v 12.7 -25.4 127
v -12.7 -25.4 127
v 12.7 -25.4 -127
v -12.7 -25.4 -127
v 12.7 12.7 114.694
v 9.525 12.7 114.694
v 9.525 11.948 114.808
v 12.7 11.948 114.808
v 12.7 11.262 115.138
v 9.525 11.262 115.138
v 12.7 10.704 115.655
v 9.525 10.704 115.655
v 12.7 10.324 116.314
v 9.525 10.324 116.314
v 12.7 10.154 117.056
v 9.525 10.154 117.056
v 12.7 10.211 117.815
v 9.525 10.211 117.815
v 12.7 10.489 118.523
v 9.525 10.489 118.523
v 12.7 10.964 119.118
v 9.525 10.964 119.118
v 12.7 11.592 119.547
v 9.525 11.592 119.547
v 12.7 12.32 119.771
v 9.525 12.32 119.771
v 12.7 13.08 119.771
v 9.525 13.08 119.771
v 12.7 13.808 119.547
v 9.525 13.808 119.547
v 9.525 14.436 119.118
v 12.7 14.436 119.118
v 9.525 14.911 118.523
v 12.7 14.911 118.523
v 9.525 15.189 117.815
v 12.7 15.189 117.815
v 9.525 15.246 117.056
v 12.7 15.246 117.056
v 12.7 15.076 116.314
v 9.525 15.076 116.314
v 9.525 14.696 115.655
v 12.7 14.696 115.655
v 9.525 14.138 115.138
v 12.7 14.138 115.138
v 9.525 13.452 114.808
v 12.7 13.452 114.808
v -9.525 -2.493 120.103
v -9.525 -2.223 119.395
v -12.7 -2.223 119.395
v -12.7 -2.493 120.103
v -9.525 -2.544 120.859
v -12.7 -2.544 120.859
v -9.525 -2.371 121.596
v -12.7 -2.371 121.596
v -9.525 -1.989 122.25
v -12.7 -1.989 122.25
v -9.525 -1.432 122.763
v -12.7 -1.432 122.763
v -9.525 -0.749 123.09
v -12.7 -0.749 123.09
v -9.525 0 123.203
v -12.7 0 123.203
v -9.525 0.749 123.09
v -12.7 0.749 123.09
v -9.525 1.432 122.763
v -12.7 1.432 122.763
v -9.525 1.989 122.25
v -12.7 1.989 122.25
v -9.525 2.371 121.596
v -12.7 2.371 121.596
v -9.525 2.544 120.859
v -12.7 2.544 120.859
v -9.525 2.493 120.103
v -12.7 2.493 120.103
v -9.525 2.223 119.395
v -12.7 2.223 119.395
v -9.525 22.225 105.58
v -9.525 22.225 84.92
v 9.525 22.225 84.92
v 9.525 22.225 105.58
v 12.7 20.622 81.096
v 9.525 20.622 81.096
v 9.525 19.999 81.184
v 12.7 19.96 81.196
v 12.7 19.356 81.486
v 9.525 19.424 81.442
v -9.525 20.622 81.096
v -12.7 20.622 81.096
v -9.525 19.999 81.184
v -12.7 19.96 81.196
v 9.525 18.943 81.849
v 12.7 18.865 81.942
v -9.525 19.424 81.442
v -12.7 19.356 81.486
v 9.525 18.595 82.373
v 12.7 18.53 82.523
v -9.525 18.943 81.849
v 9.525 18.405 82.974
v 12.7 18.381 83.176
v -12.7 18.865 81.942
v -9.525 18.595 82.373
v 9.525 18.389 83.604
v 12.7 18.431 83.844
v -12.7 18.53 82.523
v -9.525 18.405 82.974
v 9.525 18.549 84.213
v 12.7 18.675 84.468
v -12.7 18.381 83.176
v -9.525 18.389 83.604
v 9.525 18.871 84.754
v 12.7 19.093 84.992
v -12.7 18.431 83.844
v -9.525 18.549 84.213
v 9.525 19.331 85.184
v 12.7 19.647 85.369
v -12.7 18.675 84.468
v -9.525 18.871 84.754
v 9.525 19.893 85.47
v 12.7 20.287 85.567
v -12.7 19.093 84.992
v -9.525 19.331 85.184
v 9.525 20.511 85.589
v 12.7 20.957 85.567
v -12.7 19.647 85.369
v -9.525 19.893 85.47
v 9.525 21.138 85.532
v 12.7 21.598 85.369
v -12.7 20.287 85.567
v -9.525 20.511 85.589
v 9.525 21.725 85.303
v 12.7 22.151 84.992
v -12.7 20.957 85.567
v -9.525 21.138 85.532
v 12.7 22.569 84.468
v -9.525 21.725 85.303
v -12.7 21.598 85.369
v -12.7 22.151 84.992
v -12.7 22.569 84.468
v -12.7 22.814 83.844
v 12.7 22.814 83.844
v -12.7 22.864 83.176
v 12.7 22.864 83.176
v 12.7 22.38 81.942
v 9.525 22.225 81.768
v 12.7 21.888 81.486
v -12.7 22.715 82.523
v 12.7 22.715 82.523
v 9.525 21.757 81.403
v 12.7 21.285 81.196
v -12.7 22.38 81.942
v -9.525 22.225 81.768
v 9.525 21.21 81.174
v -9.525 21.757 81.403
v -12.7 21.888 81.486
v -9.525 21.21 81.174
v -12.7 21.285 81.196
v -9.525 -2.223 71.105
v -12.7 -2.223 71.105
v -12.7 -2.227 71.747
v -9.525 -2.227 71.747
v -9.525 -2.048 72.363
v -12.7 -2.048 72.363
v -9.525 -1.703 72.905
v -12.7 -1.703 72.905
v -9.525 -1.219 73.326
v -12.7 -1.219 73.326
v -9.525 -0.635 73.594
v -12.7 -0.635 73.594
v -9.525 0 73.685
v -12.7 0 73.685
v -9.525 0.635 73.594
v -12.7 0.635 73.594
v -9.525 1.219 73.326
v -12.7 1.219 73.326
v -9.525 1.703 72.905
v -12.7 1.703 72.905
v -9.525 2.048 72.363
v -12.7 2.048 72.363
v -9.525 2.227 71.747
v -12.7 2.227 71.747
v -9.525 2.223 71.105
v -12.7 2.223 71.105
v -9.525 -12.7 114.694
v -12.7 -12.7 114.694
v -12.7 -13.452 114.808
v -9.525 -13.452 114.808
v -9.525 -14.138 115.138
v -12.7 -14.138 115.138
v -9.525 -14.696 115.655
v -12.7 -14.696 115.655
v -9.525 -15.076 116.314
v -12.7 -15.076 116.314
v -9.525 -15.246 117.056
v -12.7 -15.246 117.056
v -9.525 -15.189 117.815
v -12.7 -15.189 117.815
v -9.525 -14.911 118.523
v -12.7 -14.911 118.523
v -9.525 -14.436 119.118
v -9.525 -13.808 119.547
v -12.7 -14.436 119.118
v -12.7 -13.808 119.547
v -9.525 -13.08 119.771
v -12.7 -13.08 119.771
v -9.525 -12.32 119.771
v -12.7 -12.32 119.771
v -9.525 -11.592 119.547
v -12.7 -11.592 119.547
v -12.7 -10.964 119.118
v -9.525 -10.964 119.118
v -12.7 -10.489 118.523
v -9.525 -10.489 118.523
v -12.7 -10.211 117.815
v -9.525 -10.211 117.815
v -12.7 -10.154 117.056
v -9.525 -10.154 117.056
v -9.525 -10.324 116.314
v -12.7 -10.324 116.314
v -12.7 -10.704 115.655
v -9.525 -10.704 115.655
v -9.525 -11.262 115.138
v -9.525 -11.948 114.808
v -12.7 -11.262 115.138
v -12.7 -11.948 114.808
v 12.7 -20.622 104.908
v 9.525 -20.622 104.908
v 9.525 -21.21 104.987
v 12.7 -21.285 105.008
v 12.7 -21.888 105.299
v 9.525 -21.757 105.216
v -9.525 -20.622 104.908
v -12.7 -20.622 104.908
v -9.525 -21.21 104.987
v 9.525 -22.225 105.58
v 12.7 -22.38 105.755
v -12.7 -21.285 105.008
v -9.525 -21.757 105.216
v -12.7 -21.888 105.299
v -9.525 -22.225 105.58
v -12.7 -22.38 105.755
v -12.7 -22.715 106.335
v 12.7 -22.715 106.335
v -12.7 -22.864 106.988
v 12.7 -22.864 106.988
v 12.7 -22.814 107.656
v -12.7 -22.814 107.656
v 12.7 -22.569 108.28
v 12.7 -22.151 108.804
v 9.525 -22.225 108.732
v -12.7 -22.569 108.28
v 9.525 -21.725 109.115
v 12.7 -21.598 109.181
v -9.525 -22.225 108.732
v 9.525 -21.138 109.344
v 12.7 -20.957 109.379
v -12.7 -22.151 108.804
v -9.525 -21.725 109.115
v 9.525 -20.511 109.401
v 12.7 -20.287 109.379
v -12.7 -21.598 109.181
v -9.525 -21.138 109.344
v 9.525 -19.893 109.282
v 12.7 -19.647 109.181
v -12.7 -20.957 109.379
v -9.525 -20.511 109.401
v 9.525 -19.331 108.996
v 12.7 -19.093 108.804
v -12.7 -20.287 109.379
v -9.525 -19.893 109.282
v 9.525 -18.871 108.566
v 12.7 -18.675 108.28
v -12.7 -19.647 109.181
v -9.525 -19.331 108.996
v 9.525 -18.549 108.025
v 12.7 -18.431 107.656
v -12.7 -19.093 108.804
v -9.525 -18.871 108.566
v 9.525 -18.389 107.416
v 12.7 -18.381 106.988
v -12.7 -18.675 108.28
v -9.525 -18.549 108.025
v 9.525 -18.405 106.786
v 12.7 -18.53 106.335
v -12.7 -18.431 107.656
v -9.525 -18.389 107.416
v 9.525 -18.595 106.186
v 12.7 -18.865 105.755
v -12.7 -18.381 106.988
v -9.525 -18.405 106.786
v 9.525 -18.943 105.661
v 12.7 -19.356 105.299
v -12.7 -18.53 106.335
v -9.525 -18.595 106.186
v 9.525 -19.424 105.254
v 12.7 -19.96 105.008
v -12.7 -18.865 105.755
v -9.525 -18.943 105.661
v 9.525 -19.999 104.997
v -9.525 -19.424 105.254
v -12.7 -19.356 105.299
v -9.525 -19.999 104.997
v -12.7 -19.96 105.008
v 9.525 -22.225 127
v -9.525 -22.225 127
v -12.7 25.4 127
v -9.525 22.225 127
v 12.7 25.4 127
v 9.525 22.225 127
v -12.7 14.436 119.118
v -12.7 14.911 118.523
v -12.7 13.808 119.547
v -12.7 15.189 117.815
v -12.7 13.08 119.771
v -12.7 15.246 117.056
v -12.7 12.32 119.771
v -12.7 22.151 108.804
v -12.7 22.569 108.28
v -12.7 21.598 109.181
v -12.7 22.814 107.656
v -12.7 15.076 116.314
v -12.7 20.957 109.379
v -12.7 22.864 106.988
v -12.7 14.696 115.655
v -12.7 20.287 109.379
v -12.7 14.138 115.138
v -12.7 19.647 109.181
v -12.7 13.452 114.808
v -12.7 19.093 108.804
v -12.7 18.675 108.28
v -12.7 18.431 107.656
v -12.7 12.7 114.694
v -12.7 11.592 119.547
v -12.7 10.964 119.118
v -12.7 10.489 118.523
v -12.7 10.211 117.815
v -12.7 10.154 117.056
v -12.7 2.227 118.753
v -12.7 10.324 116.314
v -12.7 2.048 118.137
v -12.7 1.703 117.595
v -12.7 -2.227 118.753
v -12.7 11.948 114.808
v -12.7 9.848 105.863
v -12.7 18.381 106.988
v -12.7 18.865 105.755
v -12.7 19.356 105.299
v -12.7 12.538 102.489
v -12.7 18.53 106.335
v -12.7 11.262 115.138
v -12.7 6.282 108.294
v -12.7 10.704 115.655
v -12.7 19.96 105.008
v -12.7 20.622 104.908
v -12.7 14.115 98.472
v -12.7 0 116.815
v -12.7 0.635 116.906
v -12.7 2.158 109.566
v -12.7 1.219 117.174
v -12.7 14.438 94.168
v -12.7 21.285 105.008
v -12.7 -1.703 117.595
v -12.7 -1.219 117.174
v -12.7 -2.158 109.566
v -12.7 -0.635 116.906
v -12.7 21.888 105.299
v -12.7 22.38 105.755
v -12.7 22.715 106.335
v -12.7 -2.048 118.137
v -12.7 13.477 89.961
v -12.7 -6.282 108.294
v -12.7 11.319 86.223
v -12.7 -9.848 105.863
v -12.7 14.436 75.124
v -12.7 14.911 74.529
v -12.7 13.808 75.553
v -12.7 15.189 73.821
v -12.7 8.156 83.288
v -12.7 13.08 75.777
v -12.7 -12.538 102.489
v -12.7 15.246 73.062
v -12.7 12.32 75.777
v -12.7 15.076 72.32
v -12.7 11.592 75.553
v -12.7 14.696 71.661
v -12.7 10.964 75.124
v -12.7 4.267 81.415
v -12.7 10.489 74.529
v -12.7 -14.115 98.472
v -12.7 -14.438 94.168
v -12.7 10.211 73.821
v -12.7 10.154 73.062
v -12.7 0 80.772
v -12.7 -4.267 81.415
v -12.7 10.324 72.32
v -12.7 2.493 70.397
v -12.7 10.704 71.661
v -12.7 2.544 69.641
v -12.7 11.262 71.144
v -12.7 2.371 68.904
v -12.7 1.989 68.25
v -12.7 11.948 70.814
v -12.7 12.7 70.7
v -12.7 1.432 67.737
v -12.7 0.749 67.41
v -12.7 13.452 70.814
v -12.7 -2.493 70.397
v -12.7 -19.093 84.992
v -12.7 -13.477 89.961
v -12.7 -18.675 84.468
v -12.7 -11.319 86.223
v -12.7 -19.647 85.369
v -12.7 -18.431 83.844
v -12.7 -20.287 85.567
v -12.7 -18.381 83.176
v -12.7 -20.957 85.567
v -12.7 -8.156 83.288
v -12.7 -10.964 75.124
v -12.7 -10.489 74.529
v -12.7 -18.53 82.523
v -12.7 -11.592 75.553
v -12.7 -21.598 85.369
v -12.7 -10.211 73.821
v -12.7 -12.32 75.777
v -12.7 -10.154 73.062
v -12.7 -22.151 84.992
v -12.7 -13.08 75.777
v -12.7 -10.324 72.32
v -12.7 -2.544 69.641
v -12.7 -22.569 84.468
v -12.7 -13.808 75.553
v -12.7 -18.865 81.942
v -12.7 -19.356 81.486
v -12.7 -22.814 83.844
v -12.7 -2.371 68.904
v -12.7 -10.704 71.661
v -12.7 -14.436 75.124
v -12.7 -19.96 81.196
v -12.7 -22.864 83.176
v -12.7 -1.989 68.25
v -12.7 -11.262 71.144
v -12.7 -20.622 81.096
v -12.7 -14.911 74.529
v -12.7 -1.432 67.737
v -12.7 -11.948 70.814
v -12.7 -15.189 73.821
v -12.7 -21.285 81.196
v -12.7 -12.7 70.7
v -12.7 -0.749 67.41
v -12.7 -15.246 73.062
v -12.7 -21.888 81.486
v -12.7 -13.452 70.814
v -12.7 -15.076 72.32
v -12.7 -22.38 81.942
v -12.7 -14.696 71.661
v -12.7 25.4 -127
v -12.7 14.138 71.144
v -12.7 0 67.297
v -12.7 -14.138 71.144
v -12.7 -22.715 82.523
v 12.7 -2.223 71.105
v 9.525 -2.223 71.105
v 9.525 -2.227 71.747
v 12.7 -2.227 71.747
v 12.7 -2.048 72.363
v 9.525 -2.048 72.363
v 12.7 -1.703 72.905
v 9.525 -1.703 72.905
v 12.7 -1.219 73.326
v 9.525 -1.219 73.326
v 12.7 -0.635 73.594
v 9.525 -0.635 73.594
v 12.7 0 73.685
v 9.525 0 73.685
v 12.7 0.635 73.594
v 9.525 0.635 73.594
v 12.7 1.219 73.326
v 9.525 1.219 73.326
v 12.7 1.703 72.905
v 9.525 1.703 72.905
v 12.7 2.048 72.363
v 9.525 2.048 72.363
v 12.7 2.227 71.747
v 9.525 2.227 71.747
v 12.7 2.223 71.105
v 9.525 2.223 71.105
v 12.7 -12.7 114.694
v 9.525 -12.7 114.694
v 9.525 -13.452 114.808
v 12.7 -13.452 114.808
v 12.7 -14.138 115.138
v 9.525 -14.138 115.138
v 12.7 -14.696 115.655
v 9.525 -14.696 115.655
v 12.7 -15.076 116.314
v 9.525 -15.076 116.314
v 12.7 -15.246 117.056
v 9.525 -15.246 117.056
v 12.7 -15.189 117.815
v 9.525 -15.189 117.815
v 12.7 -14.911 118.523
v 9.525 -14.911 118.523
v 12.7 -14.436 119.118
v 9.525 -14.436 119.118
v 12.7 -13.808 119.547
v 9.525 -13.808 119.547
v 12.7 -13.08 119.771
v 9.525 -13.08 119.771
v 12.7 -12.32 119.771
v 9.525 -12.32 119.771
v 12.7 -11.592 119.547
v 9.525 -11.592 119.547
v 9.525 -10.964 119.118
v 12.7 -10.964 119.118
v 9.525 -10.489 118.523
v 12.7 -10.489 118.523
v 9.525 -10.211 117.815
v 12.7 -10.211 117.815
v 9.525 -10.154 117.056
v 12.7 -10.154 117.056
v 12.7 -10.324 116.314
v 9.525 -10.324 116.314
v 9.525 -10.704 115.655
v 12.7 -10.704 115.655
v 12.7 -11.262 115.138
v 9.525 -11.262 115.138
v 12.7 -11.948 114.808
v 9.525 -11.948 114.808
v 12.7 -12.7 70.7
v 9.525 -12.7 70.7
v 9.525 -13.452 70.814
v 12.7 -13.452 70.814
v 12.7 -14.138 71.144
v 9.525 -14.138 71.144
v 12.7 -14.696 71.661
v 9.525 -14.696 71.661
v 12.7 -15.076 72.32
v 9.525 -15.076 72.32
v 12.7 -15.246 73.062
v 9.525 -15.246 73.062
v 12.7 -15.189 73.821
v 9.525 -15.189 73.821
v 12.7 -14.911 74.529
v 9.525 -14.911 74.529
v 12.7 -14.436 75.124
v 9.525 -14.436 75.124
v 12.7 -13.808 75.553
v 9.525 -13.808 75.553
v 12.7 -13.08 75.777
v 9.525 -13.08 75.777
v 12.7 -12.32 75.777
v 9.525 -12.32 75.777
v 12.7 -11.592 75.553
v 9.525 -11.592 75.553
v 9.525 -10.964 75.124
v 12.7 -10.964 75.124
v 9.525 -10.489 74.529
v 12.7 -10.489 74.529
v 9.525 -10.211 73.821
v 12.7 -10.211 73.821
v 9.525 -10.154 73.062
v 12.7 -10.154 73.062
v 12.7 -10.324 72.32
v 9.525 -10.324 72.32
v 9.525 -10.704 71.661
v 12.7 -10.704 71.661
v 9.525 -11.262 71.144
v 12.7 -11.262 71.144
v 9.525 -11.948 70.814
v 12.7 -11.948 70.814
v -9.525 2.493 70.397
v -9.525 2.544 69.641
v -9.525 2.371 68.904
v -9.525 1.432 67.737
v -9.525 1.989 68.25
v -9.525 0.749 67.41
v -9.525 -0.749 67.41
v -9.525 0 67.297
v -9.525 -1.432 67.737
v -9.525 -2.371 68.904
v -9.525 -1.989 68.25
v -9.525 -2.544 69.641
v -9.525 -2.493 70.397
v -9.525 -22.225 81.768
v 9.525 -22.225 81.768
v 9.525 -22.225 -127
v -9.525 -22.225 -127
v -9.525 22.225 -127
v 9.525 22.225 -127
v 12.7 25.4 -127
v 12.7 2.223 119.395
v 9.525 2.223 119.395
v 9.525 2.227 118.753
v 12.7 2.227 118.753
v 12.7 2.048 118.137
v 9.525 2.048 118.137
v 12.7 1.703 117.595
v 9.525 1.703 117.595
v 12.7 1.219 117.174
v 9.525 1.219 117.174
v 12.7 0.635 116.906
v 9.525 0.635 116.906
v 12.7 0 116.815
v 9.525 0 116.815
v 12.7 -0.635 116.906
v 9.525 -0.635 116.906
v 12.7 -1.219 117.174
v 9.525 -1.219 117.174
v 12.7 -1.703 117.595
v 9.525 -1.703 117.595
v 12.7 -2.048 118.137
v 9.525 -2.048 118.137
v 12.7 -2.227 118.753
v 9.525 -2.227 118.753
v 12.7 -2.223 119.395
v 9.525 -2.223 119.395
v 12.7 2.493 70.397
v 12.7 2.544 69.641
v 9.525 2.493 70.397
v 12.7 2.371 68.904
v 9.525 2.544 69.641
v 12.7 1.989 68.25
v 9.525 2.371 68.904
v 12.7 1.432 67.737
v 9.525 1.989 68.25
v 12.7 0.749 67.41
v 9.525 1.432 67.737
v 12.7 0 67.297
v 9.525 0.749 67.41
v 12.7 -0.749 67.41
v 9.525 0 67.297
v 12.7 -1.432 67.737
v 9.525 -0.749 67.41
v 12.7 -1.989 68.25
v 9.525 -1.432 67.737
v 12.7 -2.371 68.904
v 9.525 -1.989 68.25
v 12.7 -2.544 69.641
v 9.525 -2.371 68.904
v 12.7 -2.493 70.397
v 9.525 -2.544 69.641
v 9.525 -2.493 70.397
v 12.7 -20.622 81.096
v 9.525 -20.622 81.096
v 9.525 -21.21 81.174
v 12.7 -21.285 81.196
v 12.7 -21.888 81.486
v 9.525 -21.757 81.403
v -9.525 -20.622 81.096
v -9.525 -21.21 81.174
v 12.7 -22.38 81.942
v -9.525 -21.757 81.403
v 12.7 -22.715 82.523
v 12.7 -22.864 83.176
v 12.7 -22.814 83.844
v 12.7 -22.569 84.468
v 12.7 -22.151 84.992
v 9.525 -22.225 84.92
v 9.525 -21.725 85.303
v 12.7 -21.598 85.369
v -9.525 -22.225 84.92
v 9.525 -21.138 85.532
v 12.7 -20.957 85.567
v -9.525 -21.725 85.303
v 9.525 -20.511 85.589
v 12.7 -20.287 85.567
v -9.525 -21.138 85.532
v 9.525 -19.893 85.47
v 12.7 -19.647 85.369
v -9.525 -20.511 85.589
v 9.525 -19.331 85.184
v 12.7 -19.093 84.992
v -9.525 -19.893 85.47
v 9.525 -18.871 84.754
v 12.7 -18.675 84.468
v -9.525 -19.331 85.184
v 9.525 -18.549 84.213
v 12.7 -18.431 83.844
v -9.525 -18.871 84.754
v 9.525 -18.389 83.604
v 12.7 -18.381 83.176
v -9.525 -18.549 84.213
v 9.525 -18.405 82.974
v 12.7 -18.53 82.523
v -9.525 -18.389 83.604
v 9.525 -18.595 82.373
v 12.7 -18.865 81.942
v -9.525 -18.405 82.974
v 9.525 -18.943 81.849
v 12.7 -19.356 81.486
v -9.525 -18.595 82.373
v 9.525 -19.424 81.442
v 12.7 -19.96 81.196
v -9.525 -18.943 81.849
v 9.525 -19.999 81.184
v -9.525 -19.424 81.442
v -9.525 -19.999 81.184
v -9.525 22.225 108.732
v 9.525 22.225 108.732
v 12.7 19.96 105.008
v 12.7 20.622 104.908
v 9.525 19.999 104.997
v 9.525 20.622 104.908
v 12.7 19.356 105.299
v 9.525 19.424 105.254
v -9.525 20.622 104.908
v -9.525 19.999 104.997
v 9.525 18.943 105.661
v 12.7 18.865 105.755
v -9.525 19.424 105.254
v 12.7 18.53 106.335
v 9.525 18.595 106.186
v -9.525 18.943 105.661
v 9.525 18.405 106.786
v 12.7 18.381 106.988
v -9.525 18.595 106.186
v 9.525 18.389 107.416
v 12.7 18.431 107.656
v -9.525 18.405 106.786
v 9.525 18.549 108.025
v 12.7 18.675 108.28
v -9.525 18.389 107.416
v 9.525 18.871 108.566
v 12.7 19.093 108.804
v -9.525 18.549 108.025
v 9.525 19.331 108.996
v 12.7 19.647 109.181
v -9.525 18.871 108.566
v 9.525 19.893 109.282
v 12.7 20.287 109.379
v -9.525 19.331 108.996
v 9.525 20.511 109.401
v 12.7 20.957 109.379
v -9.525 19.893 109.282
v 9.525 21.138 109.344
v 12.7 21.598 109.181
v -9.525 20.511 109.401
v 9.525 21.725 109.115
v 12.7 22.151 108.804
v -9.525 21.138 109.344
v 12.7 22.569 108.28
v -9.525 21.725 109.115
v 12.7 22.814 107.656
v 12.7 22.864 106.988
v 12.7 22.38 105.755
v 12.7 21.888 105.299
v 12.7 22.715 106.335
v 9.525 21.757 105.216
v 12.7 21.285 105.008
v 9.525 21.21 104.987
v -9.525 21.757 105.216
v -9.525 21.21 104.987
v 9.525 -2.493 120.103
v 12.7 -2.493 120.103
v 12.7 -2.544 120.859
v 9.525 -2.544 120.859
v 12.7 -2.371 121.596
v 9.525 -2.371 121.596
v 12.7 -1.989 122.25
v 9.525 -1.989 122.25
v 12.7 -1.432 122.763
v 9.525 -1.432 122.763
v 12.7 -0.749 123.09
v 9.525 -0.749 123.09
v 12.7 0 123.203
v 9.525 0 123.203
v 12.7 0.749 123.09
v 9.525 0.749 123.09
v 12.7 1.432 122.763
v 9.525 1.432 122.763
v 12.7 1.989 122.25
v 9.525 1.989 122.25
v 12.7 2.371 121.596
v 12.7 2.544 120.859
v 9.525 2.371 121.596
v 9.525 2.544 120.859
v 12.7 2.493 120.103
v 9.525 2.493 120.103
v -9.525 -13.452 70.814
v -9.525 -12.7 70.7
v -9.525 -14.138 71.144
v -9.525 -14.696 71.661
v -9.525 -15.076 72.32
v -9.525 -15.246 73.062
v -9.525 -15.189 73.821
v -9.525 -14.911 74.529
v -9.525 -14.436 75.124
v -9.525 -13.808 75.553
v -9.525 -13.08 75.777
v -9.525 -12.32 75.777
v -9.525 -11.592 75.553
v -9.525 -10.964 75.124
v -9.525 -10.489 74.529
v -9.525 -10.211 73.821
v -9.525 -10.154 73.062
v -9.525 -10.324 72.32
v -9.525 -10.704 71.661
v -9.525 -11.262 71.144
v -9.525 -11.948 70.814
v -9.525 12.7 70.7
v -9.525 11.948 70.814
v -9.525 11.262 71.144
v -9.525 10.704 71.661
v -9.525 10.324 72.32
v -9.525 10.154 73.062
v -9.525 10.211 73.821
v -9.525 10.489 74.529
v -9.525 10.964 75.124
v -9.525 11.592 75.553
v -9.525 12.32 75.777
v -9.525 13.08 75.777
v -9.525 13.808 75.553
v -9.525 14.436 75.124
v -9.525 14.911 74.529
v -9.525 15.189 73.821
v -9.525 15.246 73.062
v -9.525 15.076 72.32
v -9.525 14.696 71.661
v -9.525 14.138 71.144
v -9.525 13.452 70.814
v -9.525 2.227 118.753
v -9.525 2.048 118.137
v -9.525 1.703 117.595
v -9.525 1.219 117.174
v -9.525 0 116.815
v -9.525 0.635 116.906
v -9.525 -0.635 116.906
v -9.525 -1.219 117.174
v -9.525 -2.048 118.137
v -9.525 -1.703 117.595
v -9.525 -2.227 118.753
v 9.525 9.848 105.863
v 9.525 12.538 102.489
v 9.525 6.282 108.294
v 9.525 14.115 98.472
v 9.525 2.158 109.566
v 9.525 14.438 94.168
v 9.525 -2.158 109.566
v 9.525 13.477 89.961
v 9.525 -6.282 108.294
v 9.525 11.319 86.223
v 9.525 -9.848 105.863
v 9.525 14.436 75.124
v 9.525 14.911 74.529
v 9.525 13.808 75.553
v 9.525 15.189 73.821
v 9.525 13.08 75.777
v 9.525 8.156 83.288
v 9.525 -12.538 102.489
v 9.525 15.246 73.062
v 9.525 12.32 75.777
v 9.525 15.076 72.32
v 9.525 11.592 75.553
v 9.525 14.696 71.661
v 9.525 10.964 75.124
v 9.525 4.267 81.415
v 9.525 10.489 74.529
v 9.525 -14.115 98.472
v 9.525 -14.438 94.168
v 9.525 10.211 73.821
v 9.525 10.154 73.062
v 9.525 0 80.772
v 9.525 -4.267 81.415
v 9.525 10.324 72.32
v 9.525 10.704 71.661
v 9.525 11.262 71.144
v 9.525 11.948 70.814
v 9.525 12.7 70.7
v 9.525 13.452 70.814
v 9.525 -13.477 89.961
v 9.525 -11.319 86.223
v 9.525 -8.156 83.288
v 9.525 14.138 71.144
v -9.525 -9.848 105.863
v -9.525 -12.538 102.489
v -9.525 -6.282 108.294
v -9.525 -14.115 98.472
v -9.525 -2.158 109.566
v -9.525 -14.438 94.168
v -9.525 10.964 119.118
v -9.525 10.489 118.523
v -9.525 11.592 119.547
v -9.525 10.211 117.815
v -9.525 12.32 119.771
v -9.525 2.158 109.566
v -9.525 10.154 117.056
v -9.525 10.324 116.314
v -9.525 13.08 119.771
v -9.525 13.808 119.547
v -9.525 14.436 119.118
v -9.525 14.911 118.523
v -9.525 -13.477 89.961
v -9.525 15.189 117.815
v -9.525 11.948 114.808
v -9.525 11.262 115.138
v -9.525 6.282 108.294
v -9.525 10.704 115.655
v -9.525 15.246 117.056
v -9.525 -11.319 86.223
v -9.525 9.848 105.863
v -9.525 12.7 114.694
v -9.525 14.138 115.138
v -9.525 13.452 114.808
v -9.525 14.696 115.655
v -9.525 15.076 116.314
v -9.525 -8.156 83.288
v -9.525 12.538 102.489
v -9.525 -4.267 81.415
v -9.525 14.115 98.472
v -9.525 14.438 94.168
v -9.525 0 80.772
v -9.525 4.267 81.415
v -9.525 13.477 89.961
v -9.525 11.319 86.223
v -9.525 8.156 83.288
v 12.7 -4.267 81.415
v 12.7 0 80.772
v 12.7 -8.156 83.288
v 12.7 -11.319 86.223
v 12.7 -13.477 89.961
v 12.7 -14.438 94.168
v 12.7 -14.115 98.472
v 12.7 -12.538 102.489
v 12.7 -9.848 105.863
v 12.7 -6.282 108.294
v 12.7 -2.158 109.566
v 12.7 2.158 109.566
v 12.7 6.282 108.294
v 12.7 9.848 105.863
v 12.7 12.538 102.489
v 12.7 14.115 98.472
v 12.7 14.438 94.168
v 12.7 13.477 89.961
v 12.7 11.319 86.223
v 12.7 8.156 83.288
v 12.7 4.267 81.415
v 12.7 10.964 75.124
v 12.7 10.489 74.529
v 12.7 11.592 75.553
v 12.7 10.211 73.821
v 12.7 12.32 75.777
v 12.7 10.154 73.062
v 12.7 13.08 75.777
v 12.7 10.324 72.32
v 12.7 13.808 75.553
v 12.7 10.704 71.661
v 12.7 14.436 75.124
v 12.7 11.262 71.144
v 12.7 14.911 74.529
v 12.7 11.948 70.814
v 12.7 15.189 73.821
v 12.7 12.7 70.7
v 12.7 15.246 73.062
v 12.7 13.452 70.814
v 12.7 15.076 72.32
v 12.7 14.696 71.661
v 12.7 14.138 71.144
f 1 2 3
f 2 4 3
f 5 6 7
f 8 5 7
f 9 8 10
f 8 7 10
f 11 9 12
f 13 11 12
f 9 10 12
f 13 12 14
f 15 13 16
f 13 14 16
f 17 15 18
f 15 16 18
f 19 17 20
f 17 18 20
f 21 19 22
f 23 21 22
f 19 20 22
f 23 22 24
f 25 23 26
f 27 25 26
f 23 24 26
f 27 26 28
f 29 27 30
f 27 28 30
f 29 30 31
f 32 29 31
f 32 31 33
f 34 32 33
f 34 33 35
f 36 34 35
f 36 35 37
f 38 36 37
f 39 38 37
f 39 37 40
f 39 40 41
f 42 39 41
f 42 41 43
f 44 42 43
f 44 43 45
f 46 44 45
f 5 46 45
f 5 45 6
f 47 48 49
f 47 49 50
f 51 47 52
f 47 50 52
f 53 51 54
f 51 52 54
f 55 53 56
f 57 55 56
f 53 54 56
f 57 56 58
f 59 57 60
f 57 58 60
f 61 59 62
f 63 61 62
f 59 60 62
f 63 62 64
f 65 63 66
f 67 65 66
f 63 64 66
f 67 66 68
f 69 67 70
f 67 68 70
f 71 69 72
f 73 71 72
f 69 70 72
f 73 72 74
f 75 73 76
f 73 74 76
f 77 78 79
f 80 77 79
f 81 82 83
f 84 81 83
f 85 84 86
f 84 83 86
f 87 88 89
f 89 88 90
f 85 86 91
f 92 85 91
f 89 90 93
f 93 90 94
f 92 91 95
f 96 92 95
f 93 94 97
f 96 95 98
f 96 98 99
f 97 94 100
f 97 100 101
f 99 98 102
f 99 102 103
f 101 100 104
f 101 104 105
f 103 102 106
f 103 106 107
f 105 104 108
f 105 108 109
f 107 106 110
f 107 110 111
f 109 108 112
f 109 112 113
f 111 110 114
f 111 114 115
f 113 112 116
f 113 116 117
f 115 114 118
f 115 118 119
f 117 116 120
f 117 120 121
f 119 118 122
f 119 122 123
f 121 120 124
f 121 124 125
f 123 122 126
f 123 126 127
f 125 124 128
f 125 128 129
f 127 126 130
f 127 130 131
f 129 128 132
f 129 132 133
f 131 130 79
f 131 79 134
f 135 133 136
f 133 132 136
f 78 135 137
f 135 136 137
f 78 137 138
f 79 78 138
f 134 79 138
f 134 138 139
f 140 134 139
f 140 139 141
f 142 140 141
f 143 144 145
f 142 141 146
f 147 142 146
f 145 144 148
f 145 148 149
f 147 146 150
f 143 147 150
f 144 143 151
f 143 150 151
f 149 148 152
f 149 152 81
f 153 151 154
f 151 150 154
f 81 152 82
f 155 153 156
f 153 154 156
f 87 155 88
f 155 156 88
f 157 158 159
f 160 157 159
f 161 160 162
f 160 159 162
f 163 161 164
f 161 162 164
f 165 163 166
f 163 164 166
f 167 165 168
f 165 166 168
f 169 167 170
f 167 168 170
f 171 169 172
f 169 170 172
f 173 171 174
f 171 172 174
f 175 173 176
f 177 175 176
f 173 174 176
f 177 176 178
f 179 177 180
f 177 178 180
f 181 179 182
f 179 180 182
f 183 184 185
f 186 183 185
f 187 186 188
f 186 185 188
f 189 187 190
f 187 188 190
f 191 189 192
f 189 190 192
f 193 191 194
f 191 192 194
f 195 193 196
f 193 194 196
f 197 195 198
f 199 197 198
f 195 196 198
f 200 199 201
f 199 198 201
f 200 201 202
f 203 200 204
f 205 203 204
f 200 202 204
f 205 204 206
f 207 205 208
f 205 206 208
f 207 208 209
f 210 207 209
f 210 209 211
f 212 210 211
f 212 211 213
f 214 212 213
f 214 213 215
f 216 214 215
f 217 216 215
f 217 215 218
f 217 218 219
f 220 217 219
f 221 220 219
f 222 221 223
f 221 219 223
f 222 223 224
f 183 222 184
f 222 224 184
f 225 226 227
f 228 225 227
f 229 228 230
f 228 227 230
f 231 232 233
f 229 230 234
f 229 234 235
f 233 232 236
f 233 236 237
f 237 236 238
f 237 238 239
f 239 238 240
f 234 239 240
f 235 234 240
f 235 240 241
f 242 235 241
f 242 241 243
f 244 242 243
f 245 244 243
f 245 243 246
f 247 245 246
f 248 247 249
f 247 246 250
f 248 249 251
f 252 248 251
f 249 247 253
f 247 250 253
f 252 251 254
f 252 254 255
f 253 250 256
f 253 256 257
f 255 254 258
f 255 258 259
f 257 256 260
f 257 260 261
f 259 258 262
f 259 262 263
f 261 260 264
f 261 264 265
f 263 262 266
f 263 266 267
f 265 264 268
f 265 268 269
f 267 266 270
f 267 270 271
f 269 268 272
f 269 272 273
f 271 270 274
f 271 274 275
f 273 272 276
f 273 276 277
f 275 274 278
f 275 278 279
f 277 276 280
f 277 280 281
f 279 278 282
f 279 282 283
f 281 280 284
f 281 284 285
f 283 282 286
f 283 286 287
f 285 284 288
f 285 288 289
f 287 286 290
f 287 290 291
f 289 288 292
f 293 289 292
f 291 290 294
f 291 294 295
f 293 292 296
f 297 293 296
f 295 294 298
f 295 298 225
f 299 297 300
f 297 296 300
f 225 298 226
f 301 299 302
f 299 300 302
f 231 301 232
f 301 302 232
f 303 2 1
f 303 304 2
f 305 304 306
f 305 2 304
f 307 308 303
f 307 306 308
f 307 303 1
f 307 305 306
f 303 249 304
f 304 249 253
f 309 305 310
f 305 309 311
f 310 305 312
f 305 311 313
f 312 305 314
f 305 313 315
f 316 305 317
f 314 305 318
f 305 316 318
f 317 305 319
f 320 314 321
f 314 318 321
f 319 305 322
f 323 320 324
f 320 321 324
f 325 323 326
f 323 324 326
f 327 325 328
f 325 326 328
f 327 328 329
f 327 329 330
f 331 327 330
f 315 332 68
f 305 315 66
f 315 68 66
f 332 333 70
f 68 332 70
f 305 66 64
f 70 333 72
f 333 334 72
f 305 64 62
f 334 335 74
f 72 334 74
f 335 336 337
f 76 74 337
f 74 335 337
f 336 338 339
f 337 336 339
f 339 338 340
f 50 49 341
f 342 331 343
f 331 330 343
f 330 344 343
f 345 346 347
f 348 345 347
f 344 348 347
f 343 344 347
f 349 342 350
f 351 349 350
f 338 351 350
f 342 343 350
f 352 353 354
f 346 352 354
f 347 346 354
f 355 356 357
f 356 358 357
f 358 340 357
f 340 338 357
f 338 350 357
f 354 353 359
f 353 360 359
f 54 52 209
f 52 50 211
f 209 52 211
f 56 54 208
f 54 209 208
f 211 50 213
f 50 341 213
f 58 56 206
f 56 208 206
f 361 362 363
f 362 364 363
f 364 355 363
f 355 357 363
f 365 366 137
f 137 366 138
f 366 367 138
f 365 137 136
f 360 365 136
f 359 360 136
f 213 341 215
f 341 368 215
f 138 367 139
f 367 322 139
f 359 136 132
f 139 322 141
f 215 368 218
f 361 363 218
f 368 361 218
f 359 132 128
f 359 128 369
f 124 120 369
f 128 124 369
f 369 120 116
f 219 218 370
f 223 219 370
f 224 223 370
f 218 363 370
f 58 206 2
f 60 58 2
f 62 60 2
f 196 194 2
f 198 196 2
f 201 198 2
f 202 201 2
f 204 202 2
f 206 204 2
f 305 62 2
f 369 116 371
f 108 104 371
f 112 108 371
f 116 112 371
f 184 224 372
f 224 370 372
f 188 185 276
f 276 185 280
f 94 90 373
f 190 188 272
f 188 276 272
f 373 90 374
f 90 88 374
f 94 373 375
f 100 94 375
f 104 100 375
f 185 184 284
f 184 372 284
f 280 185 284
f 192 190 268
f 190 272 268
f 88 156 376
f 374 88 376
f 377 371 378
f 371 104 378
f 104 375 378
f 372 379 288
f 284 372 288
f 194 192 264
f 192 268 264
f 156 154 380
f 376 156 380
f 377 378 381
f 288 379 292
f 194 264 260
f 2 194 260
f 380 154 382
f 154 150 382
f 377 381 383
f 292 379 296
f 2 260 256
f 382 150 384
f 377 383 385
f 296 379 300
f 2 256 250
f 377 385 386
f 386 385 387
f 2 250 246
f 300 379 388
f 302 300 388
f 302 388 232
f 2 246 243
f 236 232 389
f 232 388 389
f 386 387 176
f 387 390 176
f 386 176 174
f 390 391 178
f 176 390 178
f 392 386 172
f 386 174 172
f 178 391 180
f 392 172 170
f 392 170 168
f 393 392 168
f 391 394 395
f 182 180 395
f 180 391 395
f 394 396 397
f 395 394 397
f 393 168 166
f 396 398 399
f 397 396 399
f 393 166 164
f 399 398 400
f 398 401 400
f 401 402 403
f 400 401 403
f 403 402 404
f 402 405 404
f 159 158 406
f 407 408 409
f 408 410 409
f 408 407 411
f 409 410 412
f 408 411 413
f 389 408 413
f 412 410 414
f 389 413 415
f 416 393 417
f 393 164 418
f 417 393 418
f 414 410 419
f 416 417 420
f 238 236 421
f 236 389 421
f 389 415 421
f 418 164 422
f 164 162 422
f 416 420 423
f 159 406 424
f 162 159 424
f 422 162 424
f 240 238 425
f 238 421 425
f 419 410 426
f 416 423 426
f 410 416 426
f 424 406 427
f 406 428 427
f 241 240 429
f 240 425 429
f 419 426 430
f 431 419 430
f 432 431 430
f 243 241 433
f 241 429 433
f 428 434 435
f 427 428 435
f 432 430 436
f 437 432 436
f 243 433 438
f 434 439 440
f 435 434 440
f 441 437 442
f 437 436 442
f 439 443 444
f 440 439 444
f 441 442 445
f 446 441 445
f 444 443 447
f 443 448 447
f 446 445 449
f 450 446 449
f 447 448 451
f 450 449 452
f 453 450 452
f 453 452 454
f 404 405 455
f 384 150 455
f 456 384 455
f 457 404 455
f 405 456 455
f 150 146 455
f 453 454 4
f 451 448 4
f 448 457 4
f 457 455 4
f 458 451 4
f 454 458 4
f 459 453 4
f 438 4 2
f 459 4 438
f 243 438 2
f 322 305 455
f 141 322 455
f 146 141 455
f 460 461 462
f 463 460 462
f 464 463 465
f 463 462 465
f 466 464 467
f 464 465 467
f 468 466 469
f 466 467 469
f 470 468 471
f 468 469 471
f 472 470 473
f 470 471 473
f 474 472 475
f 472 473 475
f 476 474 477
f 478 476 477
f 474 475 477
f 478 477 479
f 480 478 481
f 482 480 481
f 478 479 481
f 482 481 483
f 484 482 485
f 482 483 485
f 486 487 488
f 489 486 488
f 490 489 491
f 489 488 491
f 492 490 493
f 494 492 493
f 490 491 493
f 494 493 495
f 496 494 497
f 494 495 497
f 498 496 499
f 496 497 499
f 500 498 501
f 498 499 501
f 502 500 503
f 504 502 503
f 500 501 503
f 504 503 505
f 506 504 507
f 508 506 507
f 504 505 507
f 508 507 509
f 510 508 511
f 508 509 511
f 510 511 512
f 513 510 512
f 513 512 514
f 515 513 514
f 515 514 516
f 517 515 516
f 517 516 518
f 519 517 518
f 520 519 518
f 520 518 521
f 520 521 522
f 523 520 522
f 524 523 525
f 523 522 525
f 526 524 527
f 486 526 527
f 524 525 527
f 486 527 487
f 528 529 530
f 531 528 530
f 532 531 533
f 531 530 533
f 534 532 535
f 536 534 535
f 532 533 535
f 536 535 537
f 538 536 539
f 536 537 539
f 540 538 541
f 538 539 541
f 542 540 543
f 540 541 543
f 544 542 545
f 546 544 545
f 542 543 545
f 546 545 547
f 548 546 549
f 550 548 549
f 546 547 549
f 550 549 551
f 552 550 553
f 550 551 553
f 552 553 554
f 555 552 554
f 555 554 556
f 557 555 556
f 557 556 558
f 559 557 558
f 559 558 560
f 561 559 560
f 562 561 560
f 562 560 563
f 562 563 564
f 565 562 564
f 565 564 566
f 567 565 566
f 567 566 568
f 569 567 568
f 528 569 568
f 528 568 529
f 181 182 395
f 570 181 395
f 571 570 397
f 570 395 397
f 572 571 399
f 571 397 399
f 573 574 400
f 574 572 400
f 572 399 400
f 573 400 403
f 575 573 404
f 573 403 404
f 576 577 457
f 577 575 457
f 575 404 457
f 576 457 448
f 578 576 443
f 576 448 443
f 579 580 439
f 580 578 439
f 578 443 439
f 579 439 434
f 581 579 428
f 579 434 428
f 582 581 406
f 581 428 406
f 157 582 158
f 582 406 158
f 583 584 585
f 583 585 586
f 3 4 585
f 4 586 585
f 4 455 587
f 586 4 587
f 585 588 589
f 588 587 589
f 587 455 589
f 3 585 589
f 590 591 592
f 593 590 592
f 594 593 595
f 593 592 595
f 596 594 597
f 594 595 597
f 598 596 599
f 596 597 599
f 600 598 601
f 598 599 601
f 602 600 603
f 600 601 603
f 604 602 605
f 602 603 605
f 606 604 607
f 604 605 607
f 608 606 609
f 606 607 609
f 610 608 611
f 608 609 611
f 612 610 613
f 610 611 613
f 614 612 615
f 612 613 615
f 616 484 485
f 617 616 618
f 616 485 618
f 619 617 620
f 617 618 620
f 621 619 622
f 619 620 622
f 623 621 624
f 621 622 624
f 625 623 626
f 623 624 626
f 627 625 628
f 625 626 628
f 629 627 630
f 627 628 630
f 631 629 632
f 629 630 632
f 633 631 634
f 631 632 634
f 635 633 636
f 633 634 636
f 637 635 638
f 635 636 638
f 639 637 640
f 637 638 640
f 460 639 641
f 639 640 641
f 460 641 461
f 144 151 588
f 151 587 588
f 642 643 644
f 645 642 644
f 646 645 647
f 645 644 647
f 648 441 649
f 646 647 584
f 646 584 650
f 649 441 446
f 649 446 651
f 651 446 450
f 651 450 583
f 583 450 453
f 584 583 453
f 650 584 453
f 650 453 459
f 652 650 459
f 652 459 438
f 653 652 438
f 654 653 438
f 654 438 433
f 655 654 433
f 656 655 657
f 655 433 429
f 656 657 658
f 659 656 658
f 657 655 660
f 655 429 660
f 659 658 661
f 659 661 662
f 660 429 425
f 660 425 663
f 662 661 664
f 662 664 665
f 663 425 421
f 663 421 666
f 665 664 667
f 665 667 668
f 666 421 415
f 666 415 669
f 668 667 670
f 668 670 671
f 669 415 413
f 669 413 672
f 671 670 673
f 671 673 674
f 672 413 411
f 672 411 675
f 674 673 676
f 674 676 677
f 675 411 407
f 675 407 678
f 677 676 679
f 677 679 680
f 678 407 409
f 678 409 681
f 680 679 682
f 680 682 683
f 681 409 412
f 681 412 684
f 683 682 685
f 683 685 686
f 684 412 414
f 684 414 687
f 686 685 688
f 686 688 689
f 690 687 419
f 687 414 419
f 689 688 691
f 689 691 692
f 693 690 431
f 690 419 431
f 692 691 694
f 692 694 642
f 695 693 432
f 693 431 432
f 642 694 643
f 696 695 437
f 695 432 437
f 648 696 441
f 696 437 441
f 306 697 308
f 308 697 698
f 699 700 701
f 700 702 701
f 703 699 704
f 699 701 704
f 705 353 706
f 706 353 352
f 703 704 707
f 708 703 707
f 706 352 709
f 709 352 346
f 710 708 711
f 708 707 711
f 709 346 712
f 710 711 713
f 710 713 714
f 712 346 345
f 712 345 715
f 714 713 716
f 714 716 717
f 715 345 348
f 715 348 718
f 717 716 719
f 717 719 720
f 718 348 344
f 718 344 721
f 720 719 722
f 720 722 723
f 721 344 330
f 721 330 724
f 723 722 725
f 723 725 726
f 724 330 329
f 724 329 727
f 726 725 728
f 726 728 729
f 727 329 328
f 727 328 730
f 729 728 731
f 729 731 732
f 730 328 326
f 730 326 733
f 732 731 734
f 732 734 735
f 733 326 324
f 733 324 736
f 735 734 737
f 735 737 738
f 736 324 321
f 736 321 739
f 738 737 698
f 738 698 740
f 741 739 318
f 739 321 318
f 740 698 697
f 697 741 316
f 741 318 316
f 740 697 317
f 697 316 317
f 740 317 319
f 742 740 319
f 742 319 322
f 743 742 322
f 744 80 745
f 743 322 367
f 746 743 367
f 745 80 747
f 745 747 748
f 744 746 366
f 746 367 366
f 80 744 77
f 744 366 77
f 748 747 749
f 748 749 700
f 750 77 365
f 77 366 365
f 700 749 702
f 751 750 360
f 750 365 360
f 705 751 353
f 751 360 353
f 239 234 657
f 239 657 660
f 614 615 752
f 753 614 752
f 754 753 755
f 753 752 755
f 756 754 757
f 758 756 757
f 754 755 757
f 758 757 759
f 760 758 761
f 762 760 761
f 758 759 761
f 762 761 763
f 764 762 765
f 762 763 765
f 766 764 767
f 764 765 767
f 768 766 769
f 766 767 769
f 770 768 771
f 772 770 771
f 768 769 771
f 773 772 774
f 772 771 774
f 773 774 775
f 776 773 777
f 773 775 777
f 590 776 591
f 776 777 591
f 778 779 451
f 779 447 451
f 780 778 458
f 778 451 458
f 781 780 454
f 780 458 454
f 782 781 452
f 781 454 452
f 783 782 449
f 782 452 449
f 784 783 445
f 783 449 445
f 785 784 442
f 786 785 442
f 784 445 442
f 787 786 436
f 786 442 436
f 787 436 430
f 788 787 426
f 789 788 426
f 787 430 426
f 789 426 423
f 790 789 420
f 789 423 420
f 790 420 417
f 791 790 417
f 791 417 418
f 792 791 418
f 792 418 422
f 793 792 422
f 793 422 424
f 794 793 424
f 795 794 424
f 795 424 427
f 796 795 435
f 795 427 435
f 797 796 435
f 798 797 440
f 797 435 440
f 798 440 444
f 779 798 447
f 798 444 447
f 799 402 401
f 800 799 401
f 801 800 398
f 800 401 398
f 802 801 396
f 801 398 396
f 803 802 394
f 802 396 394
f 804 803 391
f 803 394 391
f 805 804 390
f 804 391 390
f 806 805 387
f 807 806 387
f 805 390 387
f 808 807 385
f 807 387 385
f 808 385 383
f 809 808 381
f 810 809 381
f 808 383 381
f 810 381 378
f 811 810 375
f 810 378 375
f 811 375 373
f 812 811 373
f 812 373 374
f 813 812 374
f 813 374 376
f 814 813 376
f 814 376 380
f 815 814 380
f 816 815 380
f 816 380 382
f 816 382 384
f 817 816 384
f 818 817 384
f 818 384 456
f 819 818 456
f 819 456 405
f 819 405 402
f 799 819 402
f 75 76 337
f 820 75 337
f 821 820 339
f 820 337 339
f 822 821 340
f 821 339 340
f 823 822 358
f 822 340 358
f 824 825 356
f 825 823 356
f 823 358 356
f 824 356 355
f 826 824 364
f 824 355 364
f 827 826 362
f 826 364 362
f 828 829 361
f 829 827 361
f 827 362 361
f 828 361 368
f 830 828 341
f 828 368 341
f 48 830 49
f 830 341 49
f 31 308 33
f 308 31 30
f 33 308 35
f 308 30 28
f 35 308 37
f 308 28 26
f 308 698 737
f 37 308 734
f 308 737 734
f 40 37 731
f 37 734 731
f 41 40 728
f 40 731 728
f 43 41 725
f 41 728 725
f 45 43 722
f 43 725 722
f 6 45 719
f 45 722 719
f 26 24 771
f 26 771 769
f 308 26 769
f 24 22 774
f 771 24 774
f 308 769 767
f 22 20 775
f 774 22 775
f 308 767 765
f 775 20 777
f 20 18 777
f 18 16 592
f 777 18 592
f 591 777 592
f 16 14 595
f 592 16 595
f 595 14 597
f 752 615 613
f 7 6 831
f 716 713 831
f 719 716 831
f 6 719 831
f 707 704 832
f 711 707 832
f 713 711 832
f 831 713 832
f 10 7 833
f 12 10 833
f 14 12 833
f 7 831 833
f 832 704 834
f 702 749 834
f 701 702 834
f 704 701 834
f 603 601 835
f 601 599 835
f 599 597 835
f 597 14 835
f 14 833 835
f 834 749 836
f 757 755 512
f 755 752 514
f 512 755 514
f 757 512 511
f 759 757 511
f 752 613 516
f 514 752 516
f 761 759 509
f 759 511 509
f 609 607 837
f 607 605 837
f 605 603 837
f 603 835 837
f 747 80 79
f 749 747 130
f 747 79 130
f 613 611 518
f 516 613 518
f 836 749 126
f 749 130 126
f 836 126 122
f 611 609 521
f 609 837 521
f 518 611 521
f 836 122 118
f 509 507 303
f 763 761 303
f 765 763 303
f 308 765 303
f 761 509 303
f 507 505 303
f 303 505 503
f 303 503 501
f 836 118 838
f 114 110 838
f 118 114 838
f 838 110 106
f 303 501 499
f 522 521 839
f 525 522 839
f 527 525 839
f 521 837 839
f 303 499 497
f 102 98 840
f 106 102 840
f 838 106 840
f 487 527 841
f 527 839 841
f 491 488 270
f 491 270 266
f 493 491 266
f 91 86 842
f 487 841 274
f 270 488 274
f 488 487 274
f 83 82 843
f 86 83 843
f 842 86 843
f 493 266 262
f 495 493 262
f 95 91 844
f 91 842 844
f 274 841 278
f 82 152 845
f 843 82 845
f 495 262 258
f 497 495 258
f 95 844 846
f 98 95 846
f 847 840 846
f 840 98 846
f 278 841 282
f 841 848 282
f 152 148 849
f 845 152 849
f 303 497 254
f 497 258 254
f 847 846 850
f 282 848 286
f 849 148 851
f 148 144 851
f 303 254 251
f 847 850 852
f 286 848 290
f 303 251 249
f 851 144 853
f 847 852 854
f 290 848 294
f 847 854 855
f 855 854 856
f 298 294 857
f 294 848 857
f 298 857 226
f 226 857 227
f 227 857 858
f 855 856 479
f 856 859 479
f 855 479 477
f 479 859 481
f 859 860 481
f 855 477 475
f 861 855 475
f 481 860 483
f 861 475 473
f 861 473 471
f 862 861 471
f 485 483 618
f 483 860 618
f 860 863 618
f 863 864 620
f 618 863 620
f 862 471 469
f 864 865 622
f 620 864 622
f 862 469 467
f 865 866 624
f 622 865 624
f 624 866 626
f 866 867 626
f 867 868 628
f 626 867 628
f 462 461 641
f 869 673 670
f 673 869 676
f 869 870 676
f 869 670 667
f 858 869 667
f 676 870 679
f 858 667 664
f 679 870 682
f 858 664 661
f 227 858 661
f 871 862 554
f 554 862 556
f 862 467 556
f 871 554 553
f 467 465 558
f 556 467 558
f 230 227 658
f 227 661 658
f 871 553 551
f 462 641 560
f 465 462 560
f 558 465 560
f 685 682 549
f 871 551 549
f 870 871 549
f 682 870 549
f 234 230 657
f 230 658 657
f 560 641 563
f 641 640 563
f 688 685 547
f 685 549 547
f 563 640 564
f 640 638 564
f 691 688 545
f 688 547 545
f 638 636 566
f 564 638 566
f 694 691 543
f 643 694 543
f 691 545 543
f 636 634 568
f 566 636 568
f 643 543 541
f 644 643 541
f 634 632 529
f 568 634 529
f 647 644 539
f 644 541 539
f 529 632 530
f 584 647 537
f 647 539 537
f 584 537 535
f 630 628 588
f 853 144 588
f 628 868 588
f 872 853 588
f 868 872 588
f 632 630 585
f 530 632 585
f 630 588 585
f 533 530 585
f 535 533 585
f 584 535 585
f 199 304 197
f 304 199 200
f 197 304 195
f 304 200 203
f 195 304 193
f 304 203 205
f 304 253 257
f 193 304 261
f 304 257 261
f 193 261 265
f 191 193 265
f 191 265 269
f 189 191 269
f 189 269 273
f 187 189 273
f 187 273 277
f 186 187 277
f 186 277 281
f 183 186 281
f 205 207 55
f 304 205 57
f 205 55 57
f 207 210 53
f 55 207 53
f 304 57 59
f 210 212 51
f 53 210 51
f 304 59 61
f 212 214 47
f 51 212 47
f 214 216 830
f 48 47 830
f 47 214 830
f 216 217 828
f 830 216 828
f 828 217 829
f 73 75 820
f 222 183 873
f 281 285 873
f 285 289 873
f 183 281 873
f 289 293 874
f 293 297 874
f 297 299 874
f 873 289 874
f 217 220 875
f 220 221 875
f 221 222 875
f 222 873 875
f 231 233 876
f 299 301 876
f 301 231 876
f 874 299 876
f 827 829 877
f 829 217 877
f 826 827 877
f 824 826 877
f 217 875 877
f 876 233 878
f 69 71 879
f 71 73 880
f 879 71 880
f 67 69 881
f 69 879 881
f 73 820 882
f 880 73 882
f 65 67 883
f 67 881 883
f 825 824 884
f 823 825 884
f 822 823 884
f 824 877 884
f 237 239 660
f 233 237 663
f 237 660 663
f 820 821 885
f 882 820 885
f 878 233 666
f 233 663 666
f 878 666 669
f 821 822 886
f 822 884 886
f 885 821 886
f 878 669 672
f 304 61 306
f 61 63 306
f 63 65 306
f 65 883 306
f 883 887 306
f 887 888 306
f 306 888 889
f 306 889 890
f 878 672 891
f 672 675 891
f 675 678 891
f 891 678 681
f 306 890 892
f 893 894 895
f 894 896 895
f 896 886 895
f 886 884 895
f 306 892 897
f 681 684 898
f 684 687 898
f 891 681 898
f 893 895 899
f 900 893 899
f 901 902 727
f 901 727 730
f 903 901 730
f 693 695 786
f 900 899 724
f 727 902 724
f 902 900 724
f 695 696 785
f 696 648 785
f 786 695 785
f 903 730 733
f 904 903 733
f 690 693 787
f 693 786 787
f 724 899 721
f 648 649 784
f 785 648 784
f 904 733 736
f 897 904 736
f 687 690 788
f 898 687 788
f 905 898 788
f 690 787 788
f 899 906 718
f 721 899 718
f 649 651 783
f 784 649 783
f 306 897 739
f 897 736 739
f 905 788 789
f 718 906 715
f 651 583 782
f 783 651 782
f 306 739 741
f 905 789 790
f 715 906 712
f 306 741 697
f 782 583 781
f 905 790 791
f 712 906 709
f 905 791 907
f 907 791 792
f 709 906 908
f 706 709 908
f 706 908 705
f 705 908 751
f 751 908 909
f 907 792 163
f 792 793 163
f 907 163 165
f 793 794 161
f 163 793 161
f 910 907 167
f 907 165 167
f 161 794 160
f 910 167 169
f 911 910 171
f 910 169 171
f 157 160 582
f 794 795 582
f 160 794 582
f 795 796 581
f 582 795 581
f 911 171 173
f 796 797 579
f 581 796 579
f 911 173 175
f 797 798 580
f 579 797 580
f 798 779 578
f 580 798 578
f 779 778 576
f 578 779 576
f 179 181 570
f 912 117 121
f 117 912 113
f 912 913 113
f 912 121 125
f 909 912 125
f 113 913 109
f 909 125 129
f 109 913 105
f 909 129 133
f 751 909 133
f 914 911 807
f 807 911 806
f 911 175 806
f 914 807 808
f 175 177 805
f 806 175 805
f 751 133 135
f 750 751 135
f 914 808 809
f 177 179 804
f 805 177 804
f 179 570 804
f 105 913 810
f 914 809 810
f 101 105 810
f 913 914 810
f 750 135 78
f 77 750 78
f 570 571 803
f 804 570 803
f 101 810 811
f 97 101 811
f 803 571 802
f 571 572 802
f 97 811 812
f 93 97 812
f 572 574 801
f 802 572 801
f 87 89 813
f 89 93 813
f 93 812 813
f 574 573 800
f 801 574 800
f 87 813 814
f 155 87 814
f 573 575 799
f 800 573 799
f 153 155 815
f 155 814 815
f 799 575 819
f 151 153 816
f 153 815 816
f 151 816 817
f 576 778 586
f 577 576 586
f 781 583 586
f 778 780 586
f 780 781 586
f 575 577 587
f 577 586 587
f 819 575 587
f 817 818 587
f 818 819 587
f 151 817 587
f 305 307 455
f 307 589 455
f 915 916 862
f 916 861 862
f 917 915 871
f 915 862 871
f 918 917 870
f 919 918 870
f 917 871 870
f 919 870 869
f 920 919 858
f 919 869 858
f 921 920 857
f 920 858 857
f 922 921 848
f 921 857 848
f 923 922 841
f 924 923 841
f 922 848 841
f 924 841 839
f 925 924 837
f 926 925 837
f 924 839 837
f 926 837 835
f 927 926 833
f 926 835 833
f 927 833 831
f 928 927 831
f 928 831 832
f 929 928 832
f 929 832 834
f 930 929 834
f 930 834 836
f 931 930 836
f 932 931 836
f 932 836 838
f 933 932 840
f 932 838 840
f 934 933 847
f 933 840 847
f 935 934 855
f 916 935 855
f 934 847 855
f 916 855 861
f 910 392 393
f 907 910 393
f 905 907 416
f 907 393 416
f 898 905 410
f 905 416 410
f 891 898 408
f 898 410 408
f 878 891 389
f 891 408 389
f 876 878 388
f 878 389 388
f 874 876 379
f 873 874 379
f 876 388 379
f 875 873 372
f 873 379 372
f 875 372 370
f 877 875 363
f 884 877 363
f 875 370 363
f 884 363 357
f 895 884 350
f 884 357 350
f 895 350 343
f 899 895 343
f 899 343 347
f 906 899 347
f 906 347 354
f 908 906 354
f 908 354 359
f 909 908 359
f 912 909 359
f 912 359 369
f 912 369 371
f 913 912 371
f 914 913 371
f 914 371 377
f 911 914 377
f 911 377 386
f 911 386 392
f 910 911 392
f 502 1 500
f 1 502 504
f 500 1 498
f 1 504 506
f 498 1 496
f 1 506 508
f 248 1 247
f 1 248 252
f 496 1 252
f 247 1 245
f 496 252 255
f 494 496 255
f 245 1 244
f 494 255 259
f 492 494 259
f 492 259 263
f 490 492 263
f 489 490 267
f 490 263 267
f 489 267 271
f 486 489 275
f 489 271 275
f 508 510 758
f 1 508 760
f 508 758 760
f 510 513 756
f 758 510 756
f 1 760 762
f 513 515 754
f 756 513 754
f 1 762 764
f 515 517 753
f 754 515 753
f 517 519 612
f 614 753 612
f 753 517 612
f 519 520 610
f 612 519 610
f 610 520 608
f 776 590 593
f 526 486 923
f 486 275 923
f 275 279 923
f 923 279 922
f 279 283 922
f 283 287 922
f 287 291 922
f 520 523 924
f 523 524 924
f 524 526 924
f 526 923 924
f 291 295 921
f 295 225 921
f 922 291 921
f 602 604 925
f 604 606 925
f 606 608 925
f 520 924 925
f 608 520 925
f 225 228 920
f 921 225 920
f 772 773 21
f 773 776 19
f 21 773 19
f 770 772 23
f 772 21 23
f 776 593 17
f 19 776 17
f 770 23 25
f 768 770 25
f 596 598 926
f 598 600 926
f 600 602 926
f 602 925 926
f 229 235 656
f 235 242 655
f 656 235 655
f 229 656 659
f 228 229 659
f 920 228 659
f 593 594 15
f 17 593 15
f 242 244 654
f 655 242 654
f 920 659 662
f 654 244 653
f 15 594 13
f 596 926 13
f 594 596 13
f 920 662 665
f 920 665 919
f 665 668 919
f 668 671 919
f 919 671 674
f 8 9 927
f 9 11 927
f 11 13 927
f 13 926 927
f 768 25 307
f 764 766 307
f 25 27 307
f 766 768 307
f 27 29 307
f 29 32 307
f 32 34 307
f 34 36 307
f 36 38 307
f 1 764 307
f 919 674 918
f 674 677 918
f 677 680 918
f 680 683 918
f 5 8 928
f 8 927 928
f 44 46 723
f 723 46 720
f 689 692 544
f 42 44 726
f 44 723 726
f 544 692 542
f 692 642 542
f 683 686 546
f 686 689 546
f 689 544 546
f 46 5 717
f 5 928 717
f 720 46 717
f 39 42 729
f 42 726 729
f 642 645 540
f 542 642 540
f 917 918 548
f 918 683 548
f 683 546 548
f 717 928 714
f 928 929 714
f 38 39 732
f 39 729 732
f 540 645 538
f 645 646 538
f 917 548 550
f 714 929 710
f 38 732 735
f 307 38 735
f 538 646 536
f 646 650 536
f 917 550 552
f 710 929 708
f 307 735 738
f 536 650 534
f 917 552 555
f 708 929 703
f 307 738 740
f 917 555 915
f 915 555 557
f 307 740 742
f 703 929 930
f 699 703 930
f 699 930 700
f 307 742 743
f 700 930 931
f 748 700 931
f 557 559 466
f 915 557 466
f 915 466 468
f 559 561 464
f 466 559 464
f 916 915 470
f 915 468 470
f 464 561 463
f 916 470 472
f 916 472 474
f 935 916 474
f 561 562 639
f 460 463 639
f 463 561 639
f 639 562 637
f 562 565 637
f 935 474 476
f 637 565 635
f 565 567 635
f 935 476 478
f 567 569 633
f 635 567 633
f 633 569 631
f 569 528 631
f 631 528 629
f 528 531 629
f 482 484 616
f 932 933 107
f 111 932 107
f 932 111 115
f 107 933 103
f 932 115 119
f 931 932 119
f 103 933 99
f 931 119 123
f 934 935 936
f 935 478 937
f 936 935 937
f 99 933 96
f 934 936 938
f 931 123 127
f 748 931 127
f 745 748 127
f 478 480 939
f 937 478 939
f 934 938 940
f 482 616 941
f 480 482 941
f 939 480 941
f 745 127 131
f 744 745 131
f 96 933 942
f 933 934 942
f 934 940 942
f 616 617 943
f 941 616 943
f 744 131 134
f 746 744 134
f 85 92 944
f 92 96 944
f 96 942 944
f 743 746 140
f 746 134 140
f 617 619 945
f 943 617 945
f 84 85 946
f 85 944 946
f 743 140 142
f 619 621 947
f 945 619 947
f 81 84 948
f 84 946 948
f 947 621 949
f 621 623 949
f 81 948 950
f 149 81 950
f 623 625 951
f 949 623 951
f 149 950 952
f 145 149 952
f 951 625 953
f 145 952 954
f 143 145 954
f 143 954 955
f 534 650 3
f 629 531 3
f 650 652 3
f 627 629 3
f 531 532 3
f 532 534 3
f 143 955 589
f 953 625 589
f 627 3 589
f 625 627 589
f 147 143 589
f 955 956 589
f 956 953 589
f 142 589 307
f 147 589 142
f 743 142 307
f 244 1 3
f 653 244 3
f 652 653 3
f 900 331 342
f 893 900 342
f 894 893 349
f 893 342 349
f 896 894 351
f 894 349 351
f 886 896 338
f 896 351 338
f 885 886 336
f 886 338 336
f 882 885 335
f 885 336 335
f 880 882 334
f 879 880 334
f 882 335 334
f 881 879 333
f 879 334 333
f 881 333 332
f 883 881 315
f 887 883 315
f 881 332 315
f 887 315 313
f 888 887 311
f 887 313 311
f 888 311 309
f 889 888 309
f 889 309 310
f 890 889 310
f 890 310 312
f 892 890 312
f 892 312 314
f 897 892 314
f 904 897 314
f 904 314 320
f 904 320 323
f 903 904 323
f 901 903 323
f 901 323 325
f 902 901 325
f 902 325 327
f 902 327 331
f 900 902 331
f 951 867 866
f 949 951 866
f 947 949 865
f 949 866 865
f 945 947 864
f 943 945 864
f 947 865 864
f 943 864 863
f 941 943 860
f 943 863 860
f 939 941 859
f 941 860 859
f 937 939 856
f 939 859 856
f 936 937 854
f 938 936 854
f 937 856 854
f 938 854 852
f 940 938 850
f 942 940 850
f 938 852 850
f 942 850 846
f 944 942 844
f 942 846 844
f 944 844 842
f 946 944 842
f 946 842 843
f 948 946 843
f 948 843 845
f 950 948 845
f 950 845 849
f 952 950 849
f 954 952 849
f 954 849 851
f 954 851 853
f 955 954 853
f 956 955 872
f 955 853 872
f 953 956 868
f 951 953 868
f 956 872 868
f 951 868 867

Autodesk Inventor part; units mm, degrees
ref_plane "XZ Plane" through (0, 0, 0) normal (0, 1, 0) x (-1, 0, 0)
ref_plane "XY Plane" through (0, 0, 0) normal (0, 0, 1) x (1, 0, 0)
sketch "Sketch1" plane through (0, 0, 0) normal (0, 0, 1) x (1, 0, 0)
  line L0 (-12.7, -25.4) -> (12.7, -25.4)
  line L1 (12.7, -25.4) -> (12.7, 25.4)
  line L2 (12.7, 25.4) -> (-12.7, 25.4)
  line L3 (-12.7, 25.4) -> (-12.7, -25.4)
  line L4 (-12.7, -25.4) -> (12.7, 25.4) construction
  line L5 (12.7, -25.4) -> (-12.7, 25.4) construction
  line L6 (-9.525, 22.225) -> (9.525, 22.225)
  line L7 (9.525, 22.225) -> (9.525, -22.225)
  line L8 (9.525, -22.225) -> (-9.525, -22.225)
  line L9 (-9.525, -22.225) -> (-9.525, 22.225)
  point P0 (0, 0)
  dimension "width" = 25.4
  dimension "height" = 50.8
  dimension "thickness" = 3.175
extrude "Extrusion1" add sketch "Sketch1" along normal mid plane 254
sketch "Sketch2" plane through (12.7, -25.4, 127) normal (1, 0, 0) x (0, 0, -1)
  line L0 (254, 50.8) -> (254, 0) construction
  line L1 (254, 0) -> (0, 0) construction
  line L2 (0, 0) -> (0, 50.8) construction
  line L3 (0, 50.8) -> (254, 50.8) construction
  circle A0 centre (31.75, 25.4) radius 23.8125 construction
  circle A1 centre (31.75, 25.4) radius 25.4 construction
  point P0 (127, 25.4)
  point P1 (57.15, 25.4)
  point P2 (53.747, 38.1)
  point P3 (44.45, 47.397)
  point P4 (31.75, 50.8)
  point P5 (19.05, 47.397)
  point P6 (9.753, 38.1)
  point P7 (6.35, 25.4)
  point P8 (9.753, 12.7)
  point P9 (19.05, 3.403)
  point P10 (31.75, 0)
  point P11 (44.45, 3.403)
  point P12 (53.747, 12.7)
  point P13 (55.5625, 25.4)
  point P14 (43.6562, 46.0222)
  point P15 (19.8437, 46.0222)
  point P16 (7.9375, 25.4)
  point P17 (19.8437, 4.7778)
  point P18 (43.6562, 4.7778)
  dimension "d13" = 47.625
  dimension "d14" = 50.8
  dimension "d5" = 31.75
  dimension "d17" = 360
  dimension "d21" = 360
hole "Hole1" at (12.7, 0, 95.25) direction (-1, 0, 0) diameter 28.956 end through all
hole "Hole2" at (12.7, 12.7, 73.253) at (12.7, 0, 69.85) at (12.7, -12.7, 73.253) at (12.7, -12.7, 117.247) at (12.7, 0, 120.65) at (12.7, 12.7, 117.247) direction (-1, 0, 0) diameter 5.1054 end through all clearance for "Flat Head Machine Screw (82)" size "#10" standard "Ansi Unified Screw Threads"
hole "Hole3" at (12.7, -20.6222, 107.1562) at (12.7, -20.6222, 83.3438) at (12.7, 0, 119.0625) at (12.7, 20.6222, 107.1562) at (12.7, 20.6222, 83.3438) at (12.7, 0, 71.4375) direction (-1, 0, 0) diameter 4.4958 end through all clearance for "Flat Head Machine Screw (82)" size "#8" standard "Ansi Unified Screw Threads"
properties part number "CL4-002" material "Aluminum 6061"
